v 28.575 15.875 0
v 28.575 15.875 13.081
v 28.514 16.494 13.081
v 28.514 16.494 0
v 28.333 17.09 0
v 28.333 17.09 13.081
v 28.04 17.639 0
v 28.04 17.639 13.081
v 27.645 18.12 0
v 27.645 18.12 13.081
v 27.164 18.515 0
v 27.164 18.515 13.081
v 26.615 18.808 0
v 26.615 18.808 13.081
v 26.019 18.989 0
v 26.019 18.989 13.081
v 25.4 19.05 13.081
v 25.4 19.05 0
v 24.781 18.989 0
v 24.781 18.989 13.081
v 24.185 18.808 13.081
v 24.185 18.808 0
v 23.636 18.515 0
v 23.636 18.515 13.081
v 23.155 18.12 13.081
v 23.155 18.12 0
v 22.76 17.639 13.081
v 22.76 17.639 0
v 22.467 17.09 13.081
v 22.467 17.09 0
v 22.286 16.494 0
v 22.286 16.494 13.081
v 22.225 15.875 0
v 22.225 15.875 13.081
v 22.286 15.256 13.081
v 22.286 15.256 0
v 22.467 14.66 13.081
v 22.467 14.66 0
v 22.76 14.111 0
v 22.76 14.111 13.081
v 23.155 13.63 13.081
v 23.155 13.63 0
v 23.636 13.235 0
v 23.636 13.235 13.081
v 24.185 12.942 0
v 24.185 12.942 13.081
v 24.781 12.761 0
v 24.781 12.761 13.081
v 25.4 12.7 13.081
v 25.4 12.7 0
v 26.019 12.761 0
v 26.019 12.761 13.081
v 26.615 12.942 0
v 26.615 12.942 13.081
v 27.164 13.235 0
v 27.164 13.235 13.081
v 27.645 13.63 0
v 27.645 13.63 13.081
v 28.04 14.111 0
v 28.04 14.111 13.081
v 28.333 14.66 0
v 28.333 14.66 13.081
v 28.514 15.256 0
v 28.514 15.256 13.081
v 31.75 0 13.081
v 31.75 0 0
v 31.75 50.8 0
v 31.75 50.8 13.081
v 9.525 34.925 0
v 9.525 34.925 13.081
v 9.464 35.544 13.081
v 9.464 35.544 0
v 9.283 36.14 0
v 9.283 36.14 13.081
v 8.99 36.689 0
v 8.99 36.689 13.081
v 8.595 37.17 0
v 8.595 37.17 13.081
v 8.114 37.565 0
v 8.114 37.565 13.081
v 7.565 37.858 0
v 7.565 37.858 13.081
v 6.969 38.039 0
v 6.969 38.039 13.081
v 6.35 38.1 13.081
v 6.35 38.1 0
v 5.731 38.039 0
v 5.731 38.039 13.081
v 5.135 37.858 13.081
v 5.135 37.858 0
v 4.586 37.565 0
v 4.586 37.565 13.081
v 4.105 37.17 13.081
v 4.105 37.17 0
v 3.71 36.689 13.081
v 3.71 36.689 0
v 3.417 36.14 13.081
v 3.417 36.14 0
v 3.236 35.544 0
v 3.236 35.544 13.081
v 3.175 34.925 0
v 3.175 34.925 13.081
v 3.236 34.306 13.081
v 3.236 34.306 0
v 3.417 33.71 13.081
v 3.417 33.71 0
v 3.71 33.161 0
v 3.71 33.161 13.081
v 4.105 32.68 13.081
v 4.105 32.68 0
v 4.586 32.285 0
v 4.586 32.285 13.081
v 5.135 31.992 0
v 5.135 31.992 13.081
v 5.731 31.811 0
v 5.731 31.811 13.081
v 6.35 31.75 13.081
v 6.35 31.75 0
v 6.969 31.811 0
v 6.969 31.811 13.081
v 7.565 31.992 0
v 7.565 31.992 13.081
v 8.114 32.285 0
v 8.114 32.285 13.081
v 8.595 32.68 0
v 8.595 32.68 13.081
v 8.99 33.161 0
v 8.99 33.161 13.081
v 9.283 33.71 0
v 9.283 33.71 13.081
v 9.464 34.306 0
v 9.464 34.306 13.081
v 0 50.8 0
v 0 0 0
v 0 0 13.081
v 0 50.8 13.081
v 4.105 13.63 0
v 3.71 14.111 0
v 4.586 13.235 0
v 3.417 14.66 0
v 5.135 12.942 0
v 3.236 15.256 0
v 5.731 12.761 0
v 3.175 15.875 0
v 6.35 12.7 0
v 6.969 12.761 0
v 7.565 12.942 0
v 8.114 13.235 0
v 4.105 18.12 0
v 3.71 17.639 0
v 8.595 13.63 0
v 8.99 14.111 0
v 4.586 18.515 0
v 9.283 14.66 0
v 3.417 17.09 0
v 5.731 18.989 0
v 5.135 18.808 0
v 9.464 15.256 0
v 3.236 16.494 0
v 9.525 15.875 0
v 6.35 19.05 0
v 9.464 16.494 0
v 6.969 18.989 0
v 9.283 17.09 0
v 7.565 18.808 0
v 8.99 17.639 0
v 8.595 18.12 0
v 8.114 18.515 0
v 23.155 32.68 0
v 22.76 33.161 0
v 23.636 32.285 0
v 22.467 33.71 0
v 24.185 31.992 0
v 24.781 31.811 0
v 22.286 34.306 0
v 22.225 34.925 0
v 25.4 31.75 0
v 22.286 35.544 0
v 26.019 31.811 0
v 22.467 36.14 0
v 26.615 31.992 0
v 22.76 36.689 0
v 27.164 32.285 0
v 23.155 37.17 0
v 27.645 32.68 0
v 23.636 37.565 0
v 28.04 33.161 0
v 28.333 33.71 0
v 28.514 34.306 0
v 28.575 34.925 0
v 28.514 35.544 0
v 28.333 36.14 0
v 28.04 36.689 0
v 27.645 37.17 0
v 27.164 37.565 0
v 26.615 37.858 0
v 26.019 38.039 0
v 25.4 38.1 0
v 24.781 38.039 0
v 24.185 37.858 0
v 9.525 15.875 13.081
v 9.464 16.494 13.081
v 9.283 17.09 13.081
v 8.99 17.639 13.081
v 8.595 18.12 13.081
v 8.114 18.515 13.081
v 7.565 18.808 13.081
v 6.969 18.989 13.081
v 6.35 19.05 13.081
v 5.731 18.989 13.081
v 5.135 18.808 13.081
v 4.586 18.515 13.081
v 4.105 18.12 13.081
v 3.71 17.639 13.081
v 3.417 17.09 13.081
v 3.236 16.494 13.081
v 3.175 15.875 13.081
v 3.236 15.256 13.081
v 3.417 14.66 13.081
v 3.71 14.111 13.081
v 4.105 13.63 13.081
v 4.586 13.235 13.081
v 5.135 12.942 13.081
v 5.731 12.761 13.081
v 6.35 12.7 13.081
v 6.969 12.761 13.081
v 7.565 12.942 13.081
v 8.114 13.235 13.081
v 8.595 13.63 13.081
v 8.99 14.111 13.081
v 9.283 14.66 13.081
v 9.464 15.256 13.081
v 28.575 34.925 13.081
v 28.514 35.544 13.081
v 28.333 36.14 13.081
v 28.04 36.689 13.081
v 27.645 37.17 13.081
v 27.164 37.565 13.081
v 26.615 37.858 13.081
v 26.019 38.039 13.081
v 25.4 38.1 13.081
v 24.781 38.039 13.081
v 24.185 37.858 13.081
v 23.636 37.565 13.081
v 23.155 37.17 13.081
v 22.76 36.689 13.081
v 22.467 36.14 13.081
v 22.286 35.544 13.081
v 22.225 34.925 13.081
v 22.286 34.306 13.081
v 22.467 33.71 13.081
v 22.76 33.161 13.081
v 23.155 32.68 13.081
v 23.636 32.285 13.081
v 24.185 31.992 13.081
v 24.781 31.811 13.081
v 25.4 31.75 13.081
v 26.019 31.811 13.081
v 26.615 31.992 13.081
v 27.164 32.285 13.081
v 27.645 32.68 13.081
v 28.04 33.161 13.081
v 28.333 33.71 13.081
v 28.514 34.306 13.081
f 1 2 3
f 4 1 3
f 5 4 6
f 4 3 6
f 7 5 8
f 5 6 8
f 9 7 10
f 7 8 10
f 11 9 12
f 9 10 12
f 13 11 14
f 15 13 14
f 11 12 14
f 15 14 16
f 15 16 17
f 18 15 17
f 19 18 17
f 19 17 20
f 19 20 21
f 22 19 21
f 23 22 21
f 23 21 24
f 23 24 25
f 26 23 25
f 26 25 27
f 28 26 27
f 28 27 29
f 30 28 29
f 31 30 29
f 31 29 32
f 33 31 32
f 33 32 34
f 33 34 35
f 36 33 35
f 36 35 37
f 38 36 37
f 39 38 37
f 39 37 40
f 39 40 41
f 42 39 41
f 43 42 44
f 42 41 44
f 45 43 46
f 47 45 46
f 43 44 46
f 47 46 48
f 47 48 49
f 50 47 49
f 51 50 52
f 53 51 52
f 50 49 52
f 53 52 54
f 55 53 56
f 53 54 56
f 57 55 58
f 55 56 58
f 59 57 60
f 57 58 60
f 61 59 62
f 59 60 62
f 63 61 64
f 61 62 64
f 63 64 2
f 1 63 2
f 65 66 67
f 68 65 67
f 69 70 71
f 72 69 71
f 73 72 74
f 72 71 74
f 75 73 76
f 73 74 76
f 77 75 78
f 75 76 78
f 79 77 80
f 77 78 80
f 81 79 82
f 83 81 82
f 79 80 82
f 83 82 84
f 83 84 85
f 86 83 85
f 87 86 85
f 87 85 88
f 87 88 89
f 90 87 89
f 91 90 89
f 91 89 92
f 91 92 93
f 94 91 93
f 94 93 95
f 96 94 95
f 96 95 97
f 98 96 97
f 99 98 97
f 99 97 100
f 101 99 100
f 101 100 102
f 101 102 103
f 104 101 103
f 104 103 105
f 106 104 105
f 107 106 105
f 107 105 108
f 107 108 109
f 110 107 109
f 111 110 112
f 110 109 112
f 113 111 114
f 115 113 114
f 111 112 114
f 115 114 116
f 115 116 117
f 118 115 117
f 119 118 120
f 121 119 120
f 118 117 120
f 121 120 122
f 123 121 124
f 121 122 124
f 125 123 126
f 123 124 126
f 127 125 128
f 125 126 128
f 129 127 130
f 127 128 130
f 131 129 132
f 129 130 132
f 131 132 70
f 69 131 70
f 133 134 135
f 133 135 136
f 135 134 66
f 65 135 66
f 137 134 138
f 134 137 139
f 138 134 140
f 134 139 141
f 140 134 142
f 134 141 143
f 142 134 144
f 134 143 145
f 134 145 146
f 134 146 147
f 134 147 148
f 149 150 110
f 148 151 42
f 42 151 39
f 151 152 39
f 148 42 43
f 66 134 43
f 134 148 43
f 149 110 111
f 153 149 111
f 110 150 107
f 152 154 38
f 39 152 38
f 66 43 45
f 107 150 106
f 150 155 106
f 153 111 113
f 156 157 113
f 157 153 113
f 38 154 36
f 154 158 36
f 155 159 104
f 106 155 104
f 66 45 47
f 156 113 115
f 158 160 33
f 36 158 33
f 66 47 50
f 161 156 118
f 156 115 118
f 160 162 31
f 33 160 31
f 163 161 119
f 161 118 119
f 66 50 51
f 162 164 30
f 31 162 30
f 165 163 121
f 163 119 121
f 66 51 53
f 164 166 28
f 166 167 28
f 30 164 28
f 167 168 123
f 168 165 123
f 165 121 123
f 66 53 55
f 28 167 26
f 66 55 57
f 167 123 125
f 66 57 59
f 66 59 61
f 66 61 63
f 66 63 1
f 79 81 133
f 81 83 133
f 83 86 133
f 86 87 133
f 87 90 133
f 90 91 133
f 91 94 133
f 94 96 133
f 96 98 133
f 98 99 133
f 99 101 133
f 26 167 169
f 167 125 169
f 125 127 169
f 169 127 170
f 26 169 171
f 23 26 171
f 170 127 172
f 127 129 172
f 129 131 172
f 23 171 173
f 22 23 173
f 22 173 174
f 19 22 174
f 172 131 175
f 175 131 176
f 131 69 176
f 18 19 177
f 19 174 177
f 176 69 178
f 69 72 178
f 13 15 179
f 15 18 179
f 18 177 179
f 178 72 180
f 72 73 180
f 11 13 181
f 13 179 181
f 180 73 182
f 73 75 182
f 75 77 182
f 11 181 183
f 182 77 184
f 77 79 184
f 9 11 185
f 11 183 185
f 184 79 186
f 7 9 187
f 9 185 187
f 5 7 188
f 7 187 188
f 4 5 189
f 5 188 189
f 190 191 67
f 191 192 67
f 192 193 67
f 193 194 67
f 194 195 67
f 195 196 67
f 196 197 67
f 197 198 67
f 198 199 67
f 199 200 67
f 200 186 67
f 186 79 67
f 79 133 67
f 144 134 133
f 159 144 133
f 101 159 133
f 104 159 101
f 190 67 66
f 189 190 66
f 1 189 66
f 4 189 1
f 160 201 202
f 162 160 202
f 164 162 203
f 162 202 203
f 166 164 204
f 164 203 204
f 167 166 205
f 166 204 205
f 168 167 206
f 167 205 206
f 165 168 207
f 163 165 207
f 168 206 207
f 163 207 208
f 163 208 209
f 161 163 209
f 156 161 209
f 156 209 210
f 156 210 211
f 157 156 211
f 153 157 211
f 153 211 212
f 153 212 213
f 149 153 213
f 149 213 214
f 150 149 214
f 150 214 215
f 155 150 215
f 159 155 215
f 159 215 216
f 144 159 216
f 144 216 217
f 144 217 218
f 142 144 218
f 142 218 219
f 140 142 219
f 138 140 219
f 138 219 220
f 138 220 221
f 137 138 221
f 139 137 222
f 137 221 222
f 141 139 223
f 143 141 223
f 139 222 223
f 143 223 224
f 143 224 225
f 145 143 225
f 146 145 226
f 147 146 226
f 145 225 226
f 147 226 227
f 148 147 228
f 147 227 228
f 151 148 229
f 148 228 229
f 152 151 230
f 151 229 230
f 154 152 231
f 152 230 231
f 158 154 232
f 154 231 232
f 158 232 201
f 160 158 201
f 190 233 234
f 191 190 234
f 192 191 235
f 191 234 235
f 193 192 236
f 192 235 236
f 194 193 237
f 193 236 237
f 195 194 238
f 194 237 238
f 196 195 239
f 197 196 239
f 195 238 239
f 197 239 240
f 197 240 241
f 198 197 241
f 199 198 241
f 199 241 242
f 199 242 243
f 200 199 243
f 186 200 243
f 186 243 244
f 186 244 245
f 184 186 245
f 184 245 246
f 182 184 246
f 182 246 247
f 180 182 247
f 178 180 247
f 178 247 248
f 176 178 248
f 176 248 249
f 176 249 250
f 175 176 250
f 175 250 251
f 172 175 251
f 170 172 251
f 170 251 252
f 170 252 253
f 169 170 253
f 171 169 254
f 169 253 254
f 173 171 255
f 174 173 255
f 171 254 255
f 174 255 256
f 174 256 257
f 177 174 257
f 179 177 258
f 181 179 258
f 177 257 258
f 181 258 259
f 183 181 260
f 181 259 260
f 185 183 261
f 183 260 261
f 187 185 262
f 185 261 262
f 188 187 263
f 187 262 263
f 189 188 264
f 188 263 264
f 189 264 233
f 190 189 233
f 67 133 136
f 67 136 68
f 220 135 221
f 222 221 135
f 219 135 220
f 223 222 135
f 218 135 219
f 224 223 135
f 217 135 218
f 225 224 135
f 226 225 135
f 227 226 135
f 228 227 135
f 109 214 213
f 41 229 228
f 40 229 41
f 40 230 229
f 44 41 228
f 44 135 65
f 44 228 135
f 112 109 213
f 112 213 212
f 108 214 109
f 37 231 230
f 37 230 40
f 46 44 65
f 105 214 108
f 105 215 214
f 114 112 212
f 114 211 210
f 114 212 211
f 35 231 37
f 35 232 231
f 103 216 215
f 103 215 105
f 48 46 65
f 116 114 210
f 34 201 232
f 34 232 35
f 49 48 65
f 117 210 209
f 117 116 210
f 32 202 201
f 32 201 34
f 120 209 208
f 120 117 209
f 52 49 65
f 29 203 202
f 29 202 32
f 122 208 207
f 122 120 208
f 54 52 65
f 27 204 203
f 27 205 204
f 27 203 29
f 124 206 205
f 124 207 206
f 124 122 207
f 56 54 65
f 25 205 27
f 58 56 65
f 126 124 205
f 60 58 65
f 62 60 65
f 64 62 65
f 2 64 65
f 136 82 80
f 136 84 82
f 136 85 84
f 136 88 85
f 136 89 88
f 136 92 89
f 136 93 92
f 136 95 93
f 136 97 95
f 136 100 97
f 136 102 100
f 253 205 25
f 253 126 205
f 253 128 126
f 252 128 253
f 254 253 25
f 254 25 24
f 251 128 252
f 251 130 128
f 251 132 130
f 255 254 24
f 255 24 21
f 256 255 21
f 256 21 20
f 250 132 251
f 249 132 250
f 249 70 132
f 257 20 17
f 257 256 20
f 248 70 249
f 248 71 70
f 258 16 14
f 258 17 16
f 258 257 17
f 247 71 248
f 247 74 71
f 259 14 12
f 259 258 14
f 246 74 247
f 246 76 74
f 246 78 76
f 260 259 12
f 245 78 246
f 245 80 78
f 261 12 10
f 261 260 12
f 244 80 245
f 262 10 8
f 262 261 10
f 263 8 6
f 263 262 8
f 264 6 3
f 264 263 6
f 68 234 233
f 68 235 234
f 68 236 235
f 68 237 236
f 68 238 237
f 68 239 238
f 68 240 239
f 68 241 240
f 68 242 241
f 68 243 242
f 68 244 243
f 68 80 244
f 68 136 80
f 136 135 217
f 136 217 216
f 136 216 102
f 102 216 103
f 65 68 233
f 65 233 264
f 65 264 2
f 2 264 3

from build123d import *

# Parameters (mm, degrees)
SKETCH1_W           = 31.75
SKETCH1_H           = 50.8
BOSS_EXTRUDE1_DEPTH = 13.081
CUT_EXTRUDE1_REACH  = 15.081
SKETCH2_R           = 3.175


with BuildPart() as part:
    # Sketch1 → Boss-Extrude1 (new body)
    with BuildSketch(Plane.XY):
        with Locations((15.875, 25.4)):
            Rectangle(SKETCH1_W, SKETCH1_H)
    extrude(amount=BOSS_EXTRUDE1_DEPTH)

    # Sketch2 → Cut-Extrude1 (cut, up to next)
    with BuildSketch(Plane.XY.offset(13.081), mode=Mode.PRIVATE) as cut_extrude1_sk1:
        with Locations((25.4, 34.925)):
            Circle(SKETCH2_R)
    cut_extrude1_tool1 = extrude(cut_extrude1_sk1.sketch, amount=-CUT_EXTRUDE1_REACH, mode=Mode.PRIVATE) & part.part
    add(cut_extrude1_tool1.solids().sort_by_distance((25.4, 34.925, 13.081))[0], mode=Mode.SUBTRACT)
    # Sketch2 → Cut-Extrude1 (cut, up to next)
    with BuildSketch(Plane.XY.offset(13.081), mode=Mode.PRIVATE) as cut_extrude1_sk2:
        with Locations((6.35, 34.925)):
            Circle(SKETCH2_R)
    cut_extrude1_tool2 = extrude(cut_extrude1_sk2.sketch, amount=-CUT_EXTRUDE1_REACH, mode=Mode.PRIVATE) & part.part
    add(cut_extrude1_tool2.solids().sort_by_distance((6.35, 34.925, 13.081))[0], mode=Mode.SUBTRACT)
    # Sketch2 → Cut-Extrude1 (cut, up to next)
    with BuildSketch(Plane.XY.offset(13.081), mode=Mode.PRIVATE) as cut_extrude1_sk3:
        with Locations((6.35, 15.875)):
            Circle(SKETCH2_R)
    cut_extrude1_tool3 = extrude(cut_extrude1_sk3.sketch, amount=-CUT_EXTRUDE1_REACH, mode=Mode.PRIVATE) & part.part
    add(cut_extrude1_tool3.solids().sort_by_distance((6.35, 15.875, 13.081))[0], mode=Mode.SUBTRACT)
    # Sketch2 → Cut-Extrude1 (cut, up to next)
    with BuildSketch(Plane.XY.offset(13.081), mode=Mode.PRIVATE) as cut_extrude1_sk4:
        with Locations((25.4, 15.875)):
            Circle(SKETCH2_R)
    cut_extrude1_tool4 = extrude(cut_extrude1_sk4.sketch, amount=-CUT_EXTRUDE1_REACH, mode=Mode.PRIVATE) & part.part
    add(cut_extrude1_tool4.solids().sort_by_distance((25.4, 15.875, 13.081))[0], mode=Mode.SUBTRACT)


solid = part.part
